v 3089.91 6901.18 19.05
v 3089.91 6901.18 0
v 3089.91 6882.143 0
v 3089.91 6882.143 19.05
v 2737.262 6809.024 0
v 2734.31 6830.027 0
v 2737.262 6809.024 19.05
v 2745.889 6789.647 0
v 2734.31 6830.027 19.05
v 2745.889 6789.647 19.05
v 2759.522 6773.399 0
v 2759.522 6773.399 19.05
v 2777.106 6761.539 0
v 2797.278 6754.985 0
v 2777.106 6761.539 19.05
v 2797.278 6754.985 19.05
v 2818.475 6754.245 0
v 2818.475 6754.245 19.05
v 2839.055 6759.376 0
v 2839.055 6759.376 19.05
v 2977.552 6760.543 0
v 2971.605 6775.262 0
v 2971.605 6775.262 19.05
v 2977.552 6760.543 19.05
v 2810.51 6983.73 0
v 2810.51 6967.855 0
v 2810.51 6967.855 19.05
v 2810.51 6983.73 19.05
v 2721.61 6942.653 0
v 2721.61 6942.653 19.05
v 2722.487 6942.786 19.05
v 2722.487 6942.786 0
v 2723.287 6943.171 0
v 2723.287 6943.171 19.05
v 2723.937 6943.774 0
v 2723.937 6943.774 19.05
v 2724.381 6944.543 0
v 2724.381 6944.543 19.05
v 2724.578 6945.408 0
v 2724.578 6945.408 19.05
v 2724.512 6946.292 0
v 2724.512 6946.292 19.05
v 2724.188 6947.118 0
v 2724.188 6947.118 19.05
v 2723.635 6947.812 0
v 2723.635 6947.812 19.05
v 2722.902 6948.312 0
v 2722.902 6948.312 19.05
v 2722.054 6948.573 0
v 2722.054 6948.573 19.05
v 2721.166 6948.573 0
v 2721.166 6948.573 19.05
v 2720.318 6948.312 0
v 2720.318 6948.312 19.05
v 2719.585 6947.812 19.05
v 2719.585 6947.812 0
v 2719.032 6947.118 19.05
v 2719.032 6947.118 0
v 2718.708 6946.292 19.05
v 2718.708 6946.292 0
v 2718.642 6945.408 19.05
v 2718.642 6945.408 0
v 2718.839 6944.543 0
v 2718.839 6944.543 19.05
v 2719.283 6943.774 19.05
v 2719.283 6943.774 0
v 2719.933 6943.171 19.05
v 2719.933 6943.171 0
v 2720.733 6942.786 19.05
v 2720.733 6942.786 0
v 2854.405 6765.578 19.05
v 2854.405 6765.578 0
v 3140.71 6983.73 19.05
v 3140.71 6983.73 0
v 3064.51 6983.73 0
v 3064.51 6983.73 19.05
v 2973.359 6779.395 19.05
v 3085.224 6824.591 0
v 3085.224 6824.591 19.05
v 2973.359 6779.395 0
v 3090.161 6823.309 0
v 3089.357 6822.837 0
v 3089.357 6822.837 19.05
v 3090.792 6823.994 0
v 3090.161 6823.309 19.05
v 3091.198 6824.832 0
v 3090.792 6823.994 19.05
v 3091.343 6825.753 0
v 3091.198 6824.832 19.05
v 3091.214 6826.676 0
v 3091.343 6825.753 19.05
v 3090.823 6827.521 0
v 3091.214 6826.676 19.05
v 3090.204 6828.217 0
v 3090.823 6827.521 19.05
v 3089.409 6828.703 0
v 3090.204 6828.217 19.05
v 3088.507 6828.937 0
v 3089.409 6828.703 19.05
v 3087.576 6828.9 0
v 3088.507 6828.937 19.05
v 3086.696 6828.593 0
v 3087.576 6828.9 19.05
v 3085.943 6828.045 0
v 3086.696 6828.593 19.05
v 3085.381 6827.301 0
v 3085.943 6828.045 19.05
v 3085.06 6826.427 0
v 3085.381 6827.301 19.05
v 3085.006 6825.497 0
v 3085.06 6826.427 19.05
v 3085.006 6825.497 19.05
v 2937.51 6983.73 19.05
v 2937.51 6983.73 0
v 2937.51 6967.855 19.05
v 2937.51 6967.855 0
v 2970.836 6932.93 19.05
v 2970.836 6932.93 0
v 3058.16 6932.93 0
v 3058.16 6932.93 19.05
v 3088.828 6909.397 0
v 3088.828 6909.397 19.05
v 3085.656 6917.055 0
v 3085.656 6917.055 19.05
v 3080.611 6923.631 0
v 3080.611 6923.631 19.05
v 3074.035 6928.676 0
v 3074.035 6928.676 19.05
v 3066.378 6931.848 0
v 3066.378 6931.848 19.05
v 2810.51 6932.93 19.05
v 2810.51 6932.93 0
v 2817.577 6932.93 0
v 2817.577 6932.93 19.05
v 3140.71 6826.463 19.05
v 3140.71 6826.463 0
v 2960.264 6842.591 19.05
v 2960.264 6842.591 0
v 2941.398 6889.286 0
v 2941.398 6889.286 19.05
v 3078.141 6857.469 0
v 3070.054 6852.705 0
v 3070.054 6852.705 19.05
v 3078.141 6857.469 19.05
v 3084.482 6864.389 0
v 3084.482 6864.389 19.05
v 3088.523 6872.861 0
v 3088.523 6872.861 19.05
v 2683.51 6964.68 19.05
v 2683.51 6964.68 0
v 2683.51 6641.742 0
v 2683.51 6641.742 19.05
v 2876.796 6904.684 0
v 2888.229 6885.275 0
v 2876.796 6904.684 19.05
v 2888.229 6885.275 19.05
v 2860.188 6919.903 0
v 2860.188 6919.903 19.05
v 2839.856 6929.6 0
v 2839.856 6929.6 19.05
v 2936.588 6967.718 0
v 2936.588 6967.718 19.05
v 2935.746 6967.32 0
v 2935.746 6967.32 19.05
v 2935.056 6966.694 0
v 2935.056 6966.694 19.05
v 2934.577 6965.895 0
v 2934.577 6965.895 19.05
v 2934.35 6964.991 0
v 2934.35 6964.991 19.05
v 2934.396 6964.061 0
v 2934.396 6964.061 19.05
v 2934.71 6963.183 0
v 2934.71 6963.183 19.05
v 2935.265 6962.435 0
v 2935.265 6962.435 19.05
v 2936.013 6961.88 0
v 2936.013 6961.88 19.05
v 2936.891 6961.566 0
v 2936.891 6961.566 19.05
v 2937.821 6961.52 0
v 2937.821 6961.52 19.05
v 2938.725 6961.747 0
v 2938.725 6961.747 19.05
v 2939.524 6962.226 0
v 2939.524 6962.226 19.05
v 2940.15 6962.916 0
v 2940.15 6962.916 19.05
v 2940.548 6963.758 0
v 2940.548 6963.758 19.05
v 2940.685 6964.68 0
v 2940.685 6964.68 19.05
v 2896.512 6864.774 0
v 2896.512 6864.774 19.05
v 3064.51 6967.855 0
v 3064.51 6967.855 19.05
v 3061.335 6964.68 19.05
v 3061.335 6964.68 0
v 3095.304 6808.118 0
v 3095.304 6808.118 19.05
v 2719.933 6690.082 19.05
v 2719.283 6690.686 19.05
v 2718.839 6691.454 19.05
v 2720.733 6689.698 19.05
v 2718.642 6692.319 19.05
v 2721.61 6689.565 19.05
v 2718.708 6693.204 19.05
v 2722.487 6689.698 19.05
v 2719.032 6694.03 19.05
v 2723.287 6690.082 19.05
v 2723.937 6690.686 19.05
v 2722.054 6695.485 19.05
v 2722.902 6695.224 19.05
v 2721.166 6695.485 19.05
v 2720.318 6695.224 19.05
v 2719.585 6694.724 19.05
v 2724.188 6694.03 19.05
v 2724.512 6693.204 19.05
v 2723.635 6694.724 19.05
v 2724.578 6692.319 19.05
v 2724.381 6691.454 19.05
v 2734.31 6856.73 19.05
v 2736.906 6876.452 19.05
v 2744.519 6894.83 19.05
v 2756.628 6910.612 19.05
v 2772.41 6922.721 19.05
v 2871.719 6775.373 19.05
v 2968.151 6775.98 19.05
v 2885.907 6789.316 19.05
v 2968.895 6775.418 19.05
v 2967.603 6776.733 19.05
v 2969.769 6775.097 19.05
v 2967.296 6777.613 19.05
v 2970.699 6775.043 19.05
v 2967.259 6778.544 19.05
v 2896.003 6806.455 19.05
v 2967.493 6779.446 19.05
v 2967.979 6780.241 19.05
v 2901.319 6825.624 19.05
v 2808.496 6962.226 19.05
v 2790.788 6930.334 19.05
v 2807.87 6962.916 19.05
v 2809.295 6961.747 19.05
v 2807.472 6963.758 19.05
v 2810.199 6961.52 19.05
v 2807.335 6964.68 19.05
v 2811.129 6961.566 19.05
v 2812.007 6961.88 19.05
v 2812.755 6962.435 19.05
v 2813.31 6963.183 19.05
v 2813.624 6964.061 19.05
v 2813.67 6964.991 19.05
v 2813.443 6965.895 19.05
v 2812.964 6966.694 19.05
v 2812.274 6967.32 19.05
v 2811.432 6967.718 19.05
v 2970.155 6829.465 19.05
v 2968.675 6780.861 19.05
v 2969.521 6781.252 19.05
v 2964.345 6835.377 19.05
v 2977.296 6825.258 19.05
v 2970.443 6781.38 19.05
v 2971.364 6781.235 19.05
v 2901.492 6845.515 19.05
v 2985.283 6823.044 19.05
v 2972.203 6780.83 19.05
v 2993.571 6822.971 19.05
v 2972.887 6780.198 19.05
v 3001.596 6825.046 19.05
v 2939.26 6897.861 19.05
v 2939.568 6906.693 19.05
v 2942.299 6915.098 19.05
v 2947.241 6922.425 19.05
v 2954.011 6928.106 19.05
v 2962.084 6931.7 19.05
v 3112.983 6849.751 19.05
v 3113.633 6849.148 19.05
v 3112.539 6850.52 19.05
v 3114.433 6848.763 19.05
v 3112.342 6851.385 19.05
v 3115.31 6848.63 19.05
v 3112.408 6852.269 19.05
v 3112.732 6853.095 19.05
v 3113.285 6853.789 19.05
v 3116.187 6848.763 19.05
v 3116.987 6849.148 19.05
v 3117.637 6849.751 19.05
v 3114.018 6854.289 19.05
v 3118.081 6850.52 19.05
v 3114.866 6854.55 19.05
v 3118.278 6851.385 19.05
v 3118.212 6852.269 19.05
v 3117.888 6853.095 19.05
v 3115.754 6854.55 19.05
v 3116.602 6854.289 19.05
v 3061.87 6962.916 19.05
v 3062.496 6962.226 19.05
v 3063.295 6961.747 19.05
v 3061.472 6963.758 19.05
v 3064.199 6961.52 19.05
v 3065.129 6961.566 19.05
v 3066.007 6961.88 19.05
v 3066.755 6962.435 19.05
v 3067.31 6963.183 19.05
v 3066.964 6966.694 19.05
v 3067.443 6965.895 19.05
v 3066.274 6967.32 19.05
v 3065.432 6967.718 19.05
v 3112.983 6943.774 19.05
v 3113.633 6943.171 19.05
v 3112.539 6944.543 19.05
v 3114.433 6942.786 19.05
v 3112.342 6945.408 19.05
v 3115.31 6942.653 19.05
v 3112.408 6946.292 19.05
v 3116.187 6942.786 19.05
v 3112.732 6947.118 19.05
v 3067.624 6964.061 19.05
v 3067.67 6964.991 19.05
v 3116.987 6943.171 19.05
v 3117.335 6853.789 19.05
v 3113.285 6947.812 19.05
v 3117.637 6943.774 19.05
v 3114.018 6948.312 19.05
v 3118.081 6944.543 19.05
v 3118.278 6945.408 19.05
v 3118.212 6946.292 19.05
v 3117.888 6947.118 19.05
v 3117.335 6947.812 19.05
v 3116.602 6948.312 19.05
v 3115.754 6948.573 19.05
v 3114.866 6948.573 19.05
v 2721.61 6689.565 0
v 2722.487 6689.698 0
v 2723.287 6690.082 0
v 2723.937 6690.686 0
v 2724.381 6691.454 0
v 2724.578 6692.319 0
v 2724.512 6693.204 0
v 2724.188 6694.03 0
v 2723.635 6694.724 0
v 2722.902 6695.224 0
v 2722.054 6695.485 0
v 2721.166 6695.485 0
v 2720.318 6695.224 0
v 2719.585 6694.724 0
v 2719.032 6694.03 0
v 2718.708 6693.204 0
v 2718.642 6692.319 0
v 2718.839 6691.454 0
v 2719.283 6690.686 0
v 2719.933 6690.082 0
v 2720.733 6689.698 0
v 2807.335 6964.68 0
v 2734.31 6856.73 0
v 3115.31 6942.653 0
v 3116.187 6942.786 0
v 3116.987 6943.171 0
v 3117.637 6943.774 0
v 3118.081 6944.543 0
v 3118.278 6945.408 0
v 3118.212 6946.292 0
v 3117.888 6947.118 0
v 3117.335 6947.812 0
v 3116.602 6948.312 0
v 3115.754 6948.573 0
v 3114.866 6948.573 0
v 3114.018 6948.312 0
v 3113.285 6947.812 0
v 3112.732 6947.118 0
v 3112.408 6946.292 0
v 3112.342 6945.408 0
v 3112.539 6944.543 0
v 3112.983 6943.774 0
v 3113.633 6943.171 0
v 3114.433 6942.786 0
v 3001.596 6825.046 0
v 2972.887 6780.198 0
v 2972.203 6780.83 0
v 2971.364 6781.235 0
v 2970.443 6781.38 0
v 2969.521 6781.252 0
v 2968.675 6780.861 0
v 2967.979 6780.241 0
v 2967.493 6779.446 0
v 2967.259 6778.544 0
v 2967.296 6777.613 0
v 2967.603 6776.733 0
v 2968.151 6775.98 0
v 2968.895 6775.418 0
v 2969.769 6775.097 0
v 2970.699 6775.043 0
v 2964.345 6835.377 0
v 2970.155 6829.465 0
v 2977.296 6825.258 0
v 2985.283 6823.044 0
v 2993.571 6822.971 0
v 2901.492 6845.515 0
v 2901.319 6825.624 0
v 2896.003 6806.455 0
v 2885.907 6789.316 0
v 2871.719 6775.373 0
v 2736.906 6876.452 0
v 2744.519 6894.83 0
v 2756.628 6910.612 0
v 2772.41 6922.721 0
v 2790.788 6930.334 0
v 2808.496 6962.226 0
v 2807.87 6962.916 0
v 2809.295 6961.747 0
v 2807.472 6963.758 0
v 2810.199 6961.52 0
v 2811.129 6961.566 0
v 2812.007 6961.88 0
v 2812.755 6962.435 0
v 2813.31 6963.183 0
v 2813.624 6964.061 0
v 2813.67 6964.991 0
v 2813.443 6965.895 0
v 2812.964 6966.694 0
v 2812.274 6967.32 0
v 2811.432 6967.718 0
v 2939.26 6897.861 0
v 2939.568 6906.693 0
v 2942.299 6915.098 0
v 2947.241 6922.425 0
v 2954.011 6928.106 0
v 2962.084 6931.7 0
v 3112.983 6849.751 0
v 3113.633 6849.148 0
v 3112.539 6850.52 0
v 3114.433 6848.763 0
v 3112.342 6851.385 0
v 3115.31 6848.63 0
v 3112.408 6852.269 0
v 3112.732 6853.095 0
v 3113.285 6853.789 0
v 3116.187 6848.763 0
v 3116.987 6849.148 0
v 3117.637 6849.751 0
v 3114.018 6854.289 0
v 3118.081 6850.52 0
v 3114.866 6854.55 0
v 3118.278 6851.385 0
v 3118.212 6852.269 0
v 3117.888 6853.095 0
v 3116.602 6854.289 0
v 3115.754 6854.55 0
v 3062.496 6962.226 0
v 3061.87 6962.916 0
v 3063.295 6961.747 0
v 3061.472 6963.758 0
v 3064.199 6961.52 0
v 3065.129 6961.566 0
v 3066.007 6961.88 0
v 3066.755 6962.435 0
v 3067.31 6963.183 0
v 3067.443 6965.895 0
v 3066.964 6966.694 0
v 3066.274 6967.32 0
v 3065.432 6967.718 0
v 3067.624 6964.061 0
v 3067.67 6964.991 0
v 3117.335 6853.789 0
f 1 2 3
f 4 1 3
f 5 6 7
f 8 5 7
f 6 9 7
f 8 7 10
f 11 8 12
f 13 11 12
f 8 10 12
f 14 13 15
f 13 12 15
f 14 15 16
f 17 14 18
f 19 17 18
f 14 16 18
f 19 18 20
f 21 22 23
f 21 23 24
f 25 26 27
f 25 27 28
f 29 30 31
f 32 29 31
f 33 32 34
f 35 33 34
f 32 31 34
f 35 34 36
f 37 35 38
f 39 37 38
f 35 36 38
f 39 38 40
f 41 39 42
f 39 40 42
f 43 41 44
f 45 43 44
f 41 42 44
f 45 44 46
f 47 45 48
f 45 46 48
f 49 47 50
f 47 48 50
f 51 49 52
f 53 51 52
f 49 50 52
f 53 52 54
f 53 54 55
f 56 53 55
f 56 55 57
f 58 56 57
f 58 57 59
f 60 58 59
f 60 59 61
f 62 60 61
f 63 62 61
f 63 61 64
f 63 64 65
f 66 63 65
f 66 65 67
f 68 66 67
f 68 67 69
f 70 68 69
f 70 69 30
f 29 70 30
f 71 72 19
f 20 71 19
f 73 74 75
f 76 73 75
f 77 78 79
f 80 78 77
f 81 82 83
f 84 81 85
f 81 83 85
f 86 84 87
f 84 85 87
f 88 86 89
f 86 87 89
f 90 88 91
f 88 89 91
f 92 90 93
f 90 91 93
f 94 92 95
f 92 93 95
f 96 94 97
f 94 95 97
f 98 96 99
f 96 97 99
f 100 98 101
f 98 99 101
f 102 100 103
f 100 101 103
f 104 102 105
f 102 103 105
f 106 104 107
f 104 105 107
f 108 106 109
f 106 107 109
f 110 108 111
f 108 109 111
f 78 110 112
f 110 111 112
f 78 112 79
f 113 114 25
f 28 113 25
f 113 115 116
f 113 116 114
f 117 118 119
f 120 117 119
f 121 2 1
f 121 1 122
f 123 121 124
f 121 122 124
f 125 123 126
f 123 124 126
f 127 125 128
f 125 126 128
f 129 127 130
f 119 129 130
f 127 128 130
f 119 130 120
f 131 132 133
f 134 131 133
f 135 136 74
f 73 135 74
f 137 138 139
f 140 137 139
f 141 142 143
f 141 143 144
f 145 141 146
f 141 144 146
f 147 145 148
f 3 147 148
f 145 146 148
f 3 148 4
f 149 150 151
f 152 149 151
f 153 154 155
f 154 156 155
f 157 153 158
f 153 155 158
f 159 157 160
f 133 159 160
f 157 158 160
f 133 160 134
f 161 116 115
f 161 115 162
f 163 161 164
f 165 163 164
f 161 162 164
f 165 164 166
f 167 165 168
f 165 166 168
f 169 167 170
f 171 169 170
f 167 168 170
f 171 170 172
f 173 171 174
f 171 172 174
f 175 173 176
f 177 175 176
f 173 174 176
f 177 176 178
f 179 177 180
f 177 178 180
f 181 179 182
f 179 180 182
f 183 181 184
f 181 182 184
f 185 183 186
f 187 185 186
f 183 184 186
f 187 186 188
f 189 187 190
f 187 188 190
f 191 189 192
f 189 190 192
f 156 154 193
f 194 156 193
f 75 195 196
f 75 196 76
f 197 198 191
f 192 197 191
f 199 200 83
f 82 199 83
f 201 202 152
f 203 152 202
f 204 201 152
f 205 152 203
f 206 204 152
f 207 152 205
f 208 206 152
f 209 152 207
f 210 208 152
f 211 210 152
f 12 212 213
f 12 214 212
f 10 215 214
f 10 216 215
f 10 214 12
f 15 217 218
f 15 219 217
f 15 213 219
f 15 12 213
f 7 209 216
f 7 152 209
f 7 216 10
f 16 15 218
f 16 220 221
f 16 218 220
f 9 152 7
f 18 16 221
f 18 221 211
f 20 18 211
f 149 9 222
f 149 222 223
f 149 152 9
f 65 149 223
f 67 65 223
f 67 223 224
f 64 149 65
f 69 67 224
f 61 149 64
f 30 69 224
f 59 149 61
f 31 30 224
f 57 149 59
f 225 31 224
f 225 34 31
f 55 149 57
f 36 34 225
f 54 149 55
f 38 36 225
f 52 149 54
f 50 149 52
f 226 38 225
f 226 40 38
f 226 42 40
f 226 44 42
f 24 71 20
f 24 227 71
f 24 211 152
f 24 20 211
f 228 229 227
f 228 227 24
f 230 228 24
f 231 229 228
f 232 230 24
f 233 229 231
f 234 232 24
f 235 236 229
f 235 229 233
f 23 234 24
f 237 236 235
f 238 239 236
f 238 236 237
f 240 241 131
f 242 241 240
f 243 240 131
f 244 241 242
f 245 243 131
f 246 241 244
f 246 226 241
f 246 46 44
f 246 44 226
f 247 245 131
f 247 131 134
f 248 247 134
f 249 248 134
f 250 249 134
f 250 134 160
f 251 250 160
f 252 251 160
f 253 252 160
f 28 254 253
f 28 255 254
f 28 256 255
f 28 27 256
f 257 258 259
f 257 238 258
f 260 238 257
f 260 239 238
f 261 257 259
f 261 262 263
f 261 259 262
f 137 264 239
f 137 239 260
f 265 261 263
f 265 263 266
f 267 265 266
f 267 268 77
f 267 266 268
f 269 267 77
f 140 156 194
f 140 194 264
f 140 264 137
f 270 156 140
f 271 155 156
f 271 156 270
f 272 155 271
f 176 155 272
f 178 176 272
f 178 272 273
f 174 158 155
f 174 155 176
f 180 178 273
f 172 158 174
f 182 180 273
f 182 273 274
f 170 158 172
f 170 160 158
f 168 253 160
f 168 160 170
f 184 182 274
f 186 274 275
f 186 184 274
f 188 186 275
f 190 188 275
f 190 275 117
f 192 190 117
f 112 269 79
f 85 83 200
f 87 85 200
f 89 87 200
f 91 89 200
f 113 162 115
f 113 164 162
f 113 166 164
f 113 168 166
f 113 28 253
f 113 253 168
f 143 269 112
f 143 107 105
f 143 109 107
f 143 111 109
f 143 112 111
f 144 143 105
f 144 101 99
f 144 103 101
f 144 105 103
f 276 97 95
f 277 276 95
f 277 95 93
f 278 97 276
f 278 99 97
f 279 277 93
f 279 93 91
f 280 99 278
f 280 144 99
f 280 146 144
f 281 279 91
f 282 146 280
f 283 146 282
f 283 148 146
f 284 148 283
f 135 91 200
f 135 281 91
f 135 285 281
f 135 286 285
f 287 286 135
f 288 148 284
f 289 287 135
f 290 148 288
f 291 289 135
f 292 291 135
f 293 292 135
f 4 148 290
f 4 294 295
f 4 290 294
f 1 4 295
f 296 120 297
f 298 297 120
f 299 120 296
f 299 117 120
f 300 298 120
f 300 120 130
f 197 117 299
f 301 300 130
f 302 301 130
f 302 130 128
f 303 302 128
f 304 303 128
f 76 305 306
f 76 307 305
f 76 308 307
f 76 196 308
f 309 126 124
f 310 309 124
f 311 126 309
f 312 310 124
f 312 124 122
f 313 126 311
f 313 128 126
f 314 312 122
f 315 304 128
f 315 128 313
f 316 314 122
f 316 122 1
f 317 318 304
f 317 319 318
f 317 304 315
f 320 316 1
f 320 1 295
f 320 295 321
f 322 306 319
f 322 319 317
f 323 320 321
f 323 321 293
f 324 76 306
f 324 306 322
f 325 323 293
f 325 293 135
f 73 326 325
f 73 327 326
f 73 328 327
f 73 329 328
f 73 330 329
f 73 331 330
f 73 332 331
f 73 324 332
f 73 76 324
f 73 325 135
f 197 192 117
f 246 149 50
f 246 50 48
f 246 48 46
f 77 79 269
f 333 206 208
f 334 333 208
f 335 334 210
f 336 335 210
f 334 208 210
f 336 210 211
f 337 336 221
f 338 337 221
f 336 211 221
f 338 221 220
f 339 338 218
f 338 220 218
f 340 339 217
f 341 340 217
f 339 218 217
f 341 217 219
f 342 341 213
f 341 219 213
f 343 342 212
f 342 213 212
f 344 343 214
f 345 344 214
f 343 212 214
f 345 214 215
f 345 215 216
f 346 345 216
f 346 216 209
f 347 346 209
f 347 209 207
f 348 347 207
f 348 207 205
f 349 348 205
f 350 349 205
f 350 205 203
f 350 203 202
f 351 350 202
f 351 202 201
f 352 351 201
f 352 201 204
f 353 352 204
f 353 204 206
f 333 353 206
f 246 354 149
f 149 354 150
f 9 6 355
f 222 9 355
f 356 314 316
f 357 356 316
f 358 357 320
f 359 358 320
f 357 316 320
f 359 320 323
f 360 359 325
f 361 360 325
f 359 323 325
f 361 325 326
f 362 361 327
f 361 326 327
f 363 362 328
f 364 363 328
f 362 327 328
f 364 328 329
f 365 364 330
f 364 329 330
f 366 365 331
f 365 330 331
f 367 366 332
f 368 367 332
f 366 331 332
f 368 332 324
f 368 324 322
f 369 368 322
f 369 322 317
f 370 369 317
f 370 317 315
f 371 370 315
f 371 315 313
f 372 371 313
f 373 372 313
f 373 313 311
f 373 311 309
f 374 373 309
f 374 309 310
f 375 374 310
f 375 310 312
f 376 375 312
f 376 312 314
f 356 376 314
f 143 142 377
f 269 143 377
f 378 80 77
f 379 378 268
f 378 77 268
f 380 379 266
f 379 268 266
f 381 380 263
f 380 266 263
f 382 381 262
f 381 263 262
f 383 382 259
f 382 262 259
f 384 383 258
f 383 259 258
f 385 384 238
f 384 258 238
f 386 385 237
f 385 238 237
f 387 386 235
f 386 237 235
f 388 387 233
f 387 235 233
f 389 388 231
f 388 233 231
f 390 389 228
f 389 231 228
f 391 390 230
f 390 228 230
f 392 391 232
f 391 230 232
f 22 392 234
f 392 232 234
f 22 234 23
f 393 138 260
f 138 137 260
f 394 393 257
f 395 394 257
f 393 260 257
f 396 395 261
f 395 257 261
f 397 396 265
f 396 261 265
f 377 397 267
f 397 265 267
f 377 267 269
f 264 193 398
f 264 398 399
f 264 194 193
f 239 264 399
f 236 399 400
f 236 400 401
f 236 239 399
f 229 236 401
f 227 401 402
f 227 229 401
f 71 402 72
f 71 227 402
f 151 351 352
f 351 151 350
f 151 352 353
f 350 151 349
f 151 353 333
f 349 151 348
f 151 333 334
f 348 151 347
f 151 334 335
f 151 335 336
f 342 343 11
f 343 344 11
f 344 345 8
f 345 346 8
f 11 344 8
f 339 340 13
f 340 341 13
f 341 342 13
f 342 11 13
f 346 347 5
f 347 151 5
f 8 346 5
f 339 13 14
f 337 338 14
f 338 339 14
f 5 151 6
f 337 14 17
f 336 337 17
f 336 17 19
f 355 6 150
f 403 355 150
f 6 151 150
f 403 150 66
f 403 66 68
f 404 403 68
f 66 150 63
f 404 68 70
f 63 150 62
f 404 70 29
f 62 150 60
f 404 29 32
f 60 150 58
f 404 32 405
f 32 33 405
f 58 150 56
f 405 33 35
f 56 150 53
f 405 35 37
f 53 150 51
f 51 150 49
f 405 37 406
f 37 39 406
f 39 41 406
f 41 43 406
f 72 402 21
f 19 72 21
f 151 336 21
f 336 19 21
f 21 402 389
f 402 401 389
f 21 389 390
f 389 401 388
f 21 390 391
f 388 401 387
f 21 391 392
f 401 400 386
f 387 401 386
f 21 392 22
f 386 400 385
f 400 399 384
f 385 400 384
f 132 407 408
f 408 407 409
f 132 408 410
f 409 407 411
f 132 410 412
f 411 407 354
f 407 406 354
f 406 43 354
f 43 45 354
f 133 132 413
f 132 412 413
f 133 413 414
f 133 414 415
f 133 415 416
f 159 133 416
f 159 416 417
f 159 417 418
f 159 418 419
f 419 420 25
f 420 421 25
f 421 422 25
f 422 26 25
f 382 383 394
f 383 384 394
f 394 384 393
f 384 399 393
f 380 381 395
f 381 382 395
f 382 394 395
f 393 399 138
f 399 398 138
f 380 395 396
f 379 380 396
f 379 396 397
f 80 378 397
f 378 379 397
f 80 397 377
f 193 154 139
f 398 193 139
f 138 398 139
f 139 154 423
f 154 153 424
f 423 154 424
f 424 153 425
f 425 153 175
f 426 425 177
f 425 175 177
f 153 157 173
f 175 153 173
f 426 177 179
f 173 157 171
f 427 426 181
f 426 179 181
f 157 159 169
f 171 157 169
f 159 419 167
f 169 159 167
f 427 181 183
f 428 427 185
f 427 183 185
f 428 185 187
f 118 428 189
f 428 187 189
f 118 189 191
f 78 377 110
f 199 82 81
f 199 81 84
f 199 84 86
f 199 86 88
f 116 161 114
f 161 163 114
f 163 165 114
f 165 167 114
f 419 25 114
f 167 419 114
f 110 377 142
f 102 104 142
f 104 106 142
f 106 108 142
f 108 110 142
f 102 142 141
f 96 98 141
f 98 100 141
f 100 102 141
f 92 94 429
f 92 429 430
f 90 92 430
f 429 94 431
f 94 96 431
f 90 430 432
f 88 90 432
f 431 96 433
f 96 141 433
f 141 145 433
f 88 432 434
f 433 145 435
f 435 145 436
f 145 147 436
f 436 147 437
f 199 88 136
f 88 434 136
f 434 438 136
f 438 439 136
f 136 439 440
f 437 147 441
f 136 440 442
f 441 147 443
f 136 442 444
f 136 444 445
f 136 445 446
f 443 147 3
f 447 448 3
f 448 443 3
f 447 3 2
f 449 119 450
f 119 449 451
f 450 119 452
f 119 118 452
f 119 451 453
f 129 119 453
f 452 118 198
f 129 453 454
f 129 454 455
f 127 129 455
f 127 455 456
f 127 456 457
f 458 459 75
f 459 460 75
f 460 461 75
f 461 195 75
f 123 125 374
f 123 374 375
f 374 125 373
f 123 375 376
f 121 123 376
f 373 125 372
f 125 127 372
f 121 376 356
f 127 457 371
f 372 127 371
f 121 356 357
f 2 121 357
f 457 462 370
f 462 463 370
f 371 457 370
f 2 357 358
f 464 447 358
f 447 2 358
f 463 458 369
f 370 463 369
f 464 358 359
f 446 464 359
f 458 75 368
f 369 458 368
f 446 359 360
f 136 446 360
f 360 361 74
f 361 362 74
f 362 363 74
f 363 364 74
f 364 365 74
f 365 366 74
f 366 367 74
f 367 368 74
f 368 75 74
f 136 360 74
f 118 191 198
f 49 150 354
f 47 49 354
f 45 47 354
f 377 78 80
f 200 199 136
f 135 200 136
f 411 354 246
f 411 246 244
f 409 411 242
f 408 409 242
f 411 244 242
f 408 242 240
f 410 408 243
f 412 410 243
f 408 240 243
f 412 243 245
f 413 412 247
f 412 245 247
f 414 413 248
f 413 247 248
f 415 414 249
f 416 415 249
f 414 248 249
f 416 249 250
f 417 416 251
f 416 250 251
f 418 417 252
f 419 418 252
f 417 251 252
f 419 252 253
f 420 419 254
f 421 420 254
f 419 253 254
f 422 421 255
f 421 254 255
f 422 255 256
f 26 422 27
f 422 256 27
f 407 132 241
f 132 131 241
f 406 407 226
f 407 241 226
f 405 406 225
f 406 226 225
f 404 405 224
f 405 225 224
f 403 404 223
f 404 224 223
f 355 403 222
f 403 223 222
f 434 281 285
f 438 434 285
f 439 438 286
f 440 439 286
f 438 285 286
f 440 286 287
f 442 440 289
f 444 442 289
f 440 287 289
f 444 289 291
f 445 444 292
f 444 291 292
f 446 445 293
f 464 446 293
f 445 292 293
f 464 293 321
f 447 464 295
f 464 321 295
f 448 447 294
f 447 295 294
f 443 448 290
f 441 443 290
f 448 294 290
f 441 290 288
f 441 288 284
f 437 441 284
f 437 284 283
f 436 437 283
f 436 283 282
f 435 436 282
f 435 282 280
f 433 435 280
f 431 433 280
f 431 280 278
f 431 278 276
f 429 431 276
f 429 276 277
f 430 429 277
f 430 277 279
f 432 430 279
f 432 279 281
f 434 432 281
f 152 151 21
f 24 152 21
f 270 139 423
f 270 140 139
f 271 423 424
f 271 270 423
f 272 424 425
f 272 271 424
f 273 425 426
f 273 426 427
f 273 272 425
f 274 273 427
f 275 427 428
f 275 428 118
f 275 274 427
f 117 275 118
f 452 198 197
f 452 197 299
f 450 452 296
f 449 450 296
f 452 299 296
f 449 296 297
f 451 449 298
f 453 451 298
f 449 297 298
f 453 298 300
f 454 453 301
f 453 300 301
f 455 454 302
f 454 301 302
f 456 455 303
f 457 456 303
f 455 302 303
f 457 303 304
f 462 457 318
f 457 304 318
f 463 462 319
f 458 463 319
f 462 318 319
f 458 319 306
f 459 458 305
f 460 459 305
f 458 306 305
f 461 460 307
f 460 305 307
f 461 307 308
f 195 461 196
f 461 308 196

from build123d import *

# Parameters (mm, degrees)
BOSS_EXTRUDE1_DEPTH              = 19.05
CUT_EXTRUDE2_DEPTH               = 7658.473916494
FILLET1_R                        = 76.2
FILLET2_R                        = 31.75
SKETCH2_W                        = 127
SKETCH2_H                        = 19.05
CUT_EXTRUDE1_DEPTH               = 7658.473916494
F_1_4_0_25_DIAMETER_HOLE1_D      = 6.35
F_15_64_0_23438_DIAMETER_HOLE1_D = 5.953252


with BuildPart() as part:
    # Sketch1 → Boss-Extrude1 (new body)
    with BuildSketch(Plane.XY):
        Polygon((3140.71, 6983.72999014), (2683.51, 6983.72999014), (2683.51, 6641.741886848), (3140.71, 6826.4626773), align=None)
    extrude(amount=BOSS_EXTRUDE1_DEPTH)

    # Sketch6 → Cut-Extrude2 (cut, through all)
    with BuildSketch(Plane(origin=(0, 0, 0), x_dir=(-1, 0, 0), z_dir=(0, 0, -1))):
        Polygon((-2923.76447292, 6932.92999014), (-3089.91, 6932.92999014), (-3089.91, 6860.727709955), (-2972.15765047, 6813.152672592), align=None)
        Polygon((-2925.056710658, 6794.122657646), (-2734.31, 6717.055984048), (-2734.31, 6932.92999014), (-2868.974907992, 6932.92999014), align=None)
    extrude(amount=-CUT_EXTRUDE2_DEPTH, mode=Mode.SUBTRACT)

    # Fillet1
    fillet1_edges = [part.edges().sort_by_distance(p)[0] for p in [
        (2925.056710658, 6794.122657646, 9.525),
        (2868.974907992, 6932.92999014, 9.525),
        (2734.31, 6932.92999014, 9.525),
        (2734.31, 6717.055984048, 9.525),
    ]]
    fillet(fillet1_edges, radius=FILLET1_R)

    # Fillet2
    fillet2_edges = [part.edges().sort_by_distance(p)[0] for p in [
        (2972.15765047, 6813.152672592, 9.525),
        (3089.91, 6860.727709955, 9.525),
        (3089.91, 6932.92999014, 9.525),
        (2923.76447292, 6932.92999014, 9.525),
    ]]
    fillet(fillet2_edges, radius=FILLET2_R)

    # Sketch2 → Cut-Extrude1 (cut, through all)
    with BuildSketch(Plane(origin=(0, 0, 0), x_dir=(-1, 0, 0), z_dir=(0, 0, -1))):
        with Locations((-2747.01, 6974.20499014)):
            Rectangle(SKETCH2_W, SKETCH2_H)
        with Locations((-3001.01, 6974.20499014)):
            Rectangle(SKETCH2_W, SKETCH2_H)
        Polygon((-2977.551881268, 6760.542518374), (-3095.304230798, 6808.117555738), (-3088.167975193, 6825.780408168), (-2970.415625663, 6778.205370804), align=None)
    extrude(amount=-CUT_EXTRUDE1_DEPTH, mode=Mode.SUBTRACT)

    # 1/4 (0.25) Diameter Hole1 (through all)
    with Locations(Plane(origin=(0, 0, 0), x_dir=(-1, 0, 0), z_dir=(0, 0, -1))):
        with Locations((-3088.167975193, 6825.780408168), (-2970.415625663, 6778.205370804), (-2937.51, 6964.67999014), (-3064.51, 6964.67999014), (-2810.51, 6964.67999014)):
            Hole(F_1_4_0_25_DIAMETER_HOLE1_D / 2)

    # 15/64 (0.23438) Diameter Hole1 (through all)
    with Locations(Plane.YX):
        with Locations((6692.541891629, 2721.610000001), (6945.629994921, 2721.610000001), (6945.629994921, 3115.310000001), (6851.60701674, 3115.310000001)):
            Hole(F_15_64_0_23438_DIAMETER_HOLE1_D / 2)


solid = part.part
